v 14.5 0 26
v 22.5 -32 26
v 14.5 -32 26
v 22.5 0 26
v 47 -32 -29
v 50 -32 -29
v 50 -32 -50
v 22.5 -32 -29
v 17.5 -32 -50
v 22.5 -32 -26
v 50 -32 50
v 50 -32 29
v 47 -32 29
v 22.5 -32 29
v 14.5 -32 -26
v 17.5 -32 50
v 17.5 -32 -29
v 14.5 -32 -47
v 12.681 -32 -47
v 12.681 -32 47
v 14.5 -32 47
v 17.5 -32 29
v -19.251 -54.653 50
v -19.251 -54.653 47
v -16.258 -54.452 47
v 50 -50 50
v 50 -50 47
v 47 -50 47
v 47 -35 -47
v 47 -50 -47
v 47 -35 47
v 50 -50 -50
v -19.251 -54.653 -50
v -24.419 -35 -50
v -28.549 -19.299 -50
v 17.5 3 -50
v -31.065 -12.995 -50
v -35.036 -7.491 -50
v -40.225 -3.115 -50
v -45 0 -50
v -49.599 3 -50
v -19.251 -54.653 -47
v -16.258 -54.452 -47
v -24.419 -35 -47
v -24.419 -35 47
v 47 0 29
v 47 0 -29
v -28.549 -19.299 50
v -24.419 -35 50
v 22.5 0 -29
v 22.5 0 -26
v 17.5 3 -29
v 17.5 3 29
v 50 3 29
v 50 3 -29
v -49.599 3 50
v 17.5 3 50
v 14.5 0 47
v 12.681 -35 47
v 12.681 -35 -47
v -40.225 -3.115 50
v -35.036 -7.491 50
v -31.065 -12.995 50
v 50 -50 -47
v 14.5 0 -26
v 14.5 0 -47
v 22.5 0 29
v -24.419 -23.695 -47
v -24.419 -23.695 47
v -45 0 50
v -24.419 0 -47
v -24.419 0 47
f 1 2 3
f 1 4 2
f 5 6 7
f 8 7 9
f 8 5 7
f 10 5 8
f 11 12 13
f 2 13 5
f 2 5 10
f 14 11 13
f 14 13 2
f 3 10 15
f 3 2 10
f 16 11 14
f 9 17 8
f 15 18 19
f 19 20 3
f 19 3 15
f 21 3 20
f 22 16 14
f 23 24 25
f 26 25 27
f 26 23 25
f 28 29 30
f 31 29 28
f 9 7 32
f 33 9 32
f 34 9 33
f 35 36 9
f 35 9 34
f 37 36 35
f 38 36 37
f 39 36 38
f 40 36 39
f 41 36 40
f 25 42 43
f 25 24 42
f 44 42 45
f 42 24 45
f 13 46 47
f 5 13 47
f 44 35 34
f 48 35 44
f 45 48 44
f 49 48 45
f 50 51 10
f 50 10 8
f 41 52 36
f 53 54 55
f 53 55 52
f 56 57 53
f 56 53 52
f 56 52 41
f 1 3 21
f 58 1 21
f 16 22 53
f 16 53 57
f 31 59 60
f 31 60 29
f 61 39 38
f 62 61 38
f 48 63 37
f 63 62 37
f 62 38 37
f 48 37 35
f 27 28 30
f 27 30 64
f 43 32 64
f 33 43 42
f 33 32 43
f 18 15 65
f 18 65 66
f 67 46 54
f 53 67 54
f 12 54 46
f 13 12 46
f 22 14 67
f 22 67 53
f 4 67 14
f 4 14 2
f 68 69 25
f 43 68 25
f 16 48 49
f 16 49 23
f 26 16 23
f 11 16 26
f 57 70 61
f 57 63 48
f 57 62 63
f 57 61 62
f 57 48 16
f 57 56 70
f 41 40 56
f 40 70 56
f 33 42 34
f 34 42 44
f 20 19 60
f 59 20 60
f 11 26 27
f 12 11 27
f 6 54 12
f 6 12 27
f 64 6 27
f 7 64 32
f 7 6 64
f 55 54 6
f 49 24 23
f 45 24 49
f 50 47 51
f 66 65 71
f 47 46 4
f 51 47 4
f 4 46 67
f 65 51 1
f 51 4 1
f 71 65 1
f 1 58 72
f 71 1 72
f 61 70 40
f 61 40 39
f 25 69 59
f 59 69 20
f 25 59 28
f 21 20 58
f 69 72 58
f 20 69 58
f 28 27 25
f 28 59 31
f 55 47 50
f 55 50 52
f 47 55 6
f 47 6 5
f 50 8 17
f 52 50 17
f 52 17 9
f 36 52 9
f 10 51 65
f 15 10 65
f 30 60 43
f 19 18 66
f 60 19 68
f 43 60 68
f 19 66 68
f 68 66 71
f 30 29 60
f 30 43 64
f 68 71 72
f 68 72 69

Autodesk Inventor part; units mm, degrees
ref_plane "YZ Plane" through (0, 0, 0) normal (1, 0, 0) x (0, 1, 0)
ref_plane "XZ Plane" through (0, 0, 0) normal (0, 1, 0) x (-1, 0, 0)
ref_plane "XY Plane" through (0, 0, 0) normal (0, 0, 1) x (1, 0, 0)
sketch "Esboço1" plane through (0, 0, 0) normal (0, 1, 0) x (-1, 0, 0)
  line L0 (50, 50) -> (-50, 50)
  line L1 (-50, 50) -> (-50, -50)
  line L2 (-50, -50) -> (50, -50)
  line L3 (50, -50) -> (50, 50)
  line L4 (-50, 3) -> (-50, -3)
  line L5 (-50, -3) -> (-50, -29)
  line L6 (-50, -29) -> (-50, -50)
  line L7 (-50, -29) -> (-17.5, -29)
  line L8 (-17.5, -29) -> (-17.5, -50)
  line L9 (-50, -50) -> (-50, 50)
  line L10 (-50, 29) -> (-17.5, 29)
  line L11 (-17.5, 29) -> (-17.5, 50)
  line L12 (24.4193, 35) -> (-9.5807, 35)
  line L13 (-9.5807, 35) -> (-9.5807, -35)
  line L14 (-9.5807, -35) -> (24.4193, -35)
  line L15 (24.4193, -35) -> (24.4193, 35)
  line L16 (-33.75, -29) -> (-39.75, -29)
  line L17 (-39.75, -29) -> (-39.75, -3)
  line L18 (-39.75, -3) -> (-33.75, -3)
  line L19 (-33.75, -3) -> (-27.75, -3)
  line L20 (-27.75, -3) -> (-27.75, -29)
  line L21 (-39.75, 29) -> (-39.75, 3)
  line L22 (-39.75, 3) -> (-33.75, 3)
  line L23 (-33.75, 3) -> (-27.75, 3)
  line L24 (-27.75, 3) -> (-27.75, 29)
  line L25 (50, -50) -> (45, -50)
  line L26 (45, -50) -> (45, 50)
  line L27 (45, 0) -> (42, 0)
  line L28 (-17.5, -29) -> (-14.5, -29)
  line L29 (-14.5, -29) -> (-14.5, -47)
  line L30 (-47, 29) -> (-47, -29)
  line L31 (54.9347, -47) -> (45, -47)
  line L32 (24.4193, -47) -> (-14.5, -47)
  line L33 (-17.5, 29) -> (-14.5, 29)
  line L34 (-14.5, 29) -> (-14.5, 47)
  line L35 (-47, -29) -> (-47, 29)
  line L36 (24.4193, 47) -> (-14.5, 47)
  line L37 (-50, 0) -> (-93.4603, 0)
  line L38 (-76.1073, 0) -> (-50, 0)
  line L39 (-47, 0) -> (56.946, 0)
  line L40 (24.4193, 50) -> (24.4193, -47)
  line L41 (93.4603, 0) -> (45, 0)
  line L42 (24.4193, 0) -> (-47, 0)
  line L43 (24.4193, -47) -> (24.4193, -50)
  line L44 (-17.5, 29) -> (-22.5, 29)
  line L45 (-22.5, 29) -> (-22.5, 26)
  line L46 (-22.5, 26) -> (-14.5, 26)
  line L47 (-14.5, 26) -> (-14.5, 29)
  line L48 (-14.5, -29) -> (-14.5, -26)
  line L49 (-17.5, -29) -> (-22.5, -29)
  line L50 (-22.5, -26) -> (-14.5, -26)
  line L51 (-22.5, -26) -> (-22.5, -29)
  point P0 (0, 0)
  point P1 (7.4193, 0)
  point P2 (42, 50)
  point P3 (-9.5807, 0)
  point P4 (42, -50)
  dimension "d0" = 100
  dimension "d1" = 100
  dimension "d2" = 6
  dimension "d3" = 26
  dimension "d4" = 21
  dimension "d5" = 32.5
  dimension "d6" = 34
  dimension "d10" = 26
  dimension "d12" = 10.25
  dimension "d13" = 67.5
  dimension "d14" = 5
  dimension "d17" = 58
  dimension "d18" = 15
  dimension "d23" = 12
  dimension "d24" = 5
  dimension "d25" = 3
  dimension "d26" = 3
extrude "Extrusão1" add sketch "Esboço1" along normal blind 3 contours L26 L27 L39 L15 L40 L0 | L40 L36 L34 L33 L11 L0 | L26 L2 L43 L40 L15 L39 L27 | L40 L12 L13 L39 L30 L10 L21 L22 L23 L24 L45 L46 L47 L34 L36 | L33 L47 L46 L45 L10 | L15 L39 L13 L12 | L15 L14 L13 L39 | L10 L30 L7 L1 | L2 L8 L28 L29 L32 L43 | L40 L32 L29 L48 L50 L51 L7 L20 L19 L18 L17 L30 L39 L13 L14 | L24 L23 L22 L21 L10 | L7 L51 L50 L48 L28 | L17 L18 L19 L20 L7
extrude "Extrusão2" add sketch "Esboço1" against normal blind 35 contours L40 L36 L34 L33 L11 L0 | L33 L47 L46 L45 L10 | L10 L30 L7 L1 | L2 L8 L28 L29 L32 L43 | L7 L51 L50 L48 L28
sketch "Esboço2" plane through (-45, 3, 50) normal (0, 0, 1) x (1, 0, 0)
  line L0 (0, -3) -> (0, 0) projected
  line L1 (0, -3) -> (13.7317, -11.9575)
  line L2 (0, -3) -> (-4.5989, 0)
  line L3 (-4.5989, 0) -> (0, 0)
  line L4 (20.5807, -3) -> (20.5807, -38) projected
  line L5 (13.7317, -11.9575) -> (20.5807, -38)
  line L6 (0, 0) -> (0, -3)
  line L7 (0, -3) -> (20.5807, -3) projected
  line L8 (0, -3) -> (20.5807, -3)
  line L9 (59.5, -3) -> (20.5807, -3) projected
  line L10 (20.5807, -3) -> (20.5807, -38)
  point P0 (45, -3)
extrude "Extrusão3" add sketch "Esboço2" against normal blind 100
sketch "Esboço5" plane through (17.5, -35, 50) normal (0, 0, 1) x (1, 0, 0)
  line L0 (-41.9193, 0) -> (0, 0) projected
  line L1 (-41.9193, 0) -> (-4.8193, 0)
  line L2 (32.5, 0) -> (32.5, 38) projected
  line L3 (-4.8193, 0) -> (32.5, 0)
  line L4 (32.5, 0) -> (32.5, 3)
  line L5 (32.5, 3) -> (-4.8193, 3)
  line L6 (-4.8193, 3) -> (-4.8193, 0)
  point P0 (-17.5, 35)
  dimension "d31" = 37.1
  dimension "d32" = 3
extrude "Extrusão4" cut sketch "Esboço5" against normal blind 100.25
extrude "Extrusão5" add sketch "Esboço5" against normal blind 100
sketch "Esboço6" plane through (50, -35, -50) normal (0, 0, -1) x (-1, 0, 0)
  line L0 (37.3193, 0) -> (74.4193, 0) projected
  line L1 (74.4193, 0) -> (81.2683, 26.0425) projected
  line L2 (74.4193, 0) -> (74.4193, -20)
  line L3 (74.4193, 0) -> (0, 0) projected
  line L4 (0, 0) -> (0, -15)
  line L5 (0, -15) -> (74.4193, -20)
  line L6 (74.4193, 0) -> (0, 0)
  point P0 (50, 35)
  dimension "d37" = 20
  dimension "d38" = 15
extrude "Extrusão6" add sketch "Esboço6" against normal blind 3
mirror "Espelhar1" about plane through (0, 0, 0) normal (0, 0, 1) of "Extrusão6"
sketch "Esboço7" plane through (0, -35, 0) normal (0, -1, 0) x (1, 0, 0)
  line L0 (50, -50) -> (50, -47) projected
  line L1 (50, -47) -> (47, -47)
  line L2 (-24.4193, -47) -> (50, -47) projected
  line L3 (47, -47) -> (47, 47)
  line L4 (-24.4193, 47) -> (50, 47) projected
  line L5 (47, 47) -> (50, 47)
  line L6 (50, 50) -> (50, 29) projected
  line L7 (50, 47) -> (50, -47)
  point P0 (0, 0)
  dimension "d41" = 3
extrude "Extrusão7" add sketch "Esboço7" along normal blind 15
sketch "Esboço8" plane through (14.5, 0, 47) normal (0, 0, -1) x (-1, 0, 0)
  line L0 (38.9193, -35) -> (38.9193, -55) projected
  line L1 (38.9193, -35) -> (35.9193, -35)
  line L2 (35.9193, -35) -> (35.9193, -54.7984)
  line L3 (38.9193, -55) -> (-35.5, -50) projected
  line L4 (35.9193, -54.7984) -> (38.9193, -55)
  line L5 (38.9193, -55) -> (38.9193, -35)
  line L6 (45.7683, -8.9575) -> (64.0989, 3) projected
  line L7 (38.9193, -35) -> (45.7683, -8.9575) projected
  line L8 (45.7683, -8.9575) -> (38.9193, -35)
  line L9 (33.7508, -54.6527) -> (44.0879, -15.3473)
  line L10 (33.7508, -54.6527) -> (38.9193, -55)
  line L11 (38.9193, -35) -> (38.9193, -55) projected
  line L12 (38.9193, 0) -> (38.9193, -35) projected
  line L13 (38.9193, -55) -> (38.9193, -35)
  point P0 (14.5, 0)
  dimension "d44" = 3
extrude "Extrusão8" cut sketch "Esboço8" along normal mid plane 260.75 contours L0 L3 L2 L9 | L2 L3 L9
sketch "Esboço9" plane through (14.5, 0, 47) normal (0, 0, -1) x (-1, 0, 0)
  line L0 (33.7508, -54.6527) -> (38.9193, -35) projected
  line L1 (33.7508, -54.6527) -> (30.7576, -54.4516)
  line L2 (33.7508, -54.6527) -> (-35.5, -50) projected
  line L3 (38.9193, -23.6948) -> (30.7576, -54.4516)
  line L4 (38.9193, -35) -> (38.9193, -23.6948)
  line L5 (38.9193, 0) -> (38.9193, -35) projected
  line L6 (38.9193, -35) -> (33.7508, -54.6527)
  line L7 (33.7508, -54.6527) -> (30.7576, -54.4516)
  point P0 (14.5, 0)
  dimension "d47" = 3
extrude "Extrusão9" add sketch "Esboço9" along normal blind 95.75
fillet "Arredondamento1" radius 27.75 1 edges at (-31.2683, -8.9575, 0)
properties part number "Peçams2"
